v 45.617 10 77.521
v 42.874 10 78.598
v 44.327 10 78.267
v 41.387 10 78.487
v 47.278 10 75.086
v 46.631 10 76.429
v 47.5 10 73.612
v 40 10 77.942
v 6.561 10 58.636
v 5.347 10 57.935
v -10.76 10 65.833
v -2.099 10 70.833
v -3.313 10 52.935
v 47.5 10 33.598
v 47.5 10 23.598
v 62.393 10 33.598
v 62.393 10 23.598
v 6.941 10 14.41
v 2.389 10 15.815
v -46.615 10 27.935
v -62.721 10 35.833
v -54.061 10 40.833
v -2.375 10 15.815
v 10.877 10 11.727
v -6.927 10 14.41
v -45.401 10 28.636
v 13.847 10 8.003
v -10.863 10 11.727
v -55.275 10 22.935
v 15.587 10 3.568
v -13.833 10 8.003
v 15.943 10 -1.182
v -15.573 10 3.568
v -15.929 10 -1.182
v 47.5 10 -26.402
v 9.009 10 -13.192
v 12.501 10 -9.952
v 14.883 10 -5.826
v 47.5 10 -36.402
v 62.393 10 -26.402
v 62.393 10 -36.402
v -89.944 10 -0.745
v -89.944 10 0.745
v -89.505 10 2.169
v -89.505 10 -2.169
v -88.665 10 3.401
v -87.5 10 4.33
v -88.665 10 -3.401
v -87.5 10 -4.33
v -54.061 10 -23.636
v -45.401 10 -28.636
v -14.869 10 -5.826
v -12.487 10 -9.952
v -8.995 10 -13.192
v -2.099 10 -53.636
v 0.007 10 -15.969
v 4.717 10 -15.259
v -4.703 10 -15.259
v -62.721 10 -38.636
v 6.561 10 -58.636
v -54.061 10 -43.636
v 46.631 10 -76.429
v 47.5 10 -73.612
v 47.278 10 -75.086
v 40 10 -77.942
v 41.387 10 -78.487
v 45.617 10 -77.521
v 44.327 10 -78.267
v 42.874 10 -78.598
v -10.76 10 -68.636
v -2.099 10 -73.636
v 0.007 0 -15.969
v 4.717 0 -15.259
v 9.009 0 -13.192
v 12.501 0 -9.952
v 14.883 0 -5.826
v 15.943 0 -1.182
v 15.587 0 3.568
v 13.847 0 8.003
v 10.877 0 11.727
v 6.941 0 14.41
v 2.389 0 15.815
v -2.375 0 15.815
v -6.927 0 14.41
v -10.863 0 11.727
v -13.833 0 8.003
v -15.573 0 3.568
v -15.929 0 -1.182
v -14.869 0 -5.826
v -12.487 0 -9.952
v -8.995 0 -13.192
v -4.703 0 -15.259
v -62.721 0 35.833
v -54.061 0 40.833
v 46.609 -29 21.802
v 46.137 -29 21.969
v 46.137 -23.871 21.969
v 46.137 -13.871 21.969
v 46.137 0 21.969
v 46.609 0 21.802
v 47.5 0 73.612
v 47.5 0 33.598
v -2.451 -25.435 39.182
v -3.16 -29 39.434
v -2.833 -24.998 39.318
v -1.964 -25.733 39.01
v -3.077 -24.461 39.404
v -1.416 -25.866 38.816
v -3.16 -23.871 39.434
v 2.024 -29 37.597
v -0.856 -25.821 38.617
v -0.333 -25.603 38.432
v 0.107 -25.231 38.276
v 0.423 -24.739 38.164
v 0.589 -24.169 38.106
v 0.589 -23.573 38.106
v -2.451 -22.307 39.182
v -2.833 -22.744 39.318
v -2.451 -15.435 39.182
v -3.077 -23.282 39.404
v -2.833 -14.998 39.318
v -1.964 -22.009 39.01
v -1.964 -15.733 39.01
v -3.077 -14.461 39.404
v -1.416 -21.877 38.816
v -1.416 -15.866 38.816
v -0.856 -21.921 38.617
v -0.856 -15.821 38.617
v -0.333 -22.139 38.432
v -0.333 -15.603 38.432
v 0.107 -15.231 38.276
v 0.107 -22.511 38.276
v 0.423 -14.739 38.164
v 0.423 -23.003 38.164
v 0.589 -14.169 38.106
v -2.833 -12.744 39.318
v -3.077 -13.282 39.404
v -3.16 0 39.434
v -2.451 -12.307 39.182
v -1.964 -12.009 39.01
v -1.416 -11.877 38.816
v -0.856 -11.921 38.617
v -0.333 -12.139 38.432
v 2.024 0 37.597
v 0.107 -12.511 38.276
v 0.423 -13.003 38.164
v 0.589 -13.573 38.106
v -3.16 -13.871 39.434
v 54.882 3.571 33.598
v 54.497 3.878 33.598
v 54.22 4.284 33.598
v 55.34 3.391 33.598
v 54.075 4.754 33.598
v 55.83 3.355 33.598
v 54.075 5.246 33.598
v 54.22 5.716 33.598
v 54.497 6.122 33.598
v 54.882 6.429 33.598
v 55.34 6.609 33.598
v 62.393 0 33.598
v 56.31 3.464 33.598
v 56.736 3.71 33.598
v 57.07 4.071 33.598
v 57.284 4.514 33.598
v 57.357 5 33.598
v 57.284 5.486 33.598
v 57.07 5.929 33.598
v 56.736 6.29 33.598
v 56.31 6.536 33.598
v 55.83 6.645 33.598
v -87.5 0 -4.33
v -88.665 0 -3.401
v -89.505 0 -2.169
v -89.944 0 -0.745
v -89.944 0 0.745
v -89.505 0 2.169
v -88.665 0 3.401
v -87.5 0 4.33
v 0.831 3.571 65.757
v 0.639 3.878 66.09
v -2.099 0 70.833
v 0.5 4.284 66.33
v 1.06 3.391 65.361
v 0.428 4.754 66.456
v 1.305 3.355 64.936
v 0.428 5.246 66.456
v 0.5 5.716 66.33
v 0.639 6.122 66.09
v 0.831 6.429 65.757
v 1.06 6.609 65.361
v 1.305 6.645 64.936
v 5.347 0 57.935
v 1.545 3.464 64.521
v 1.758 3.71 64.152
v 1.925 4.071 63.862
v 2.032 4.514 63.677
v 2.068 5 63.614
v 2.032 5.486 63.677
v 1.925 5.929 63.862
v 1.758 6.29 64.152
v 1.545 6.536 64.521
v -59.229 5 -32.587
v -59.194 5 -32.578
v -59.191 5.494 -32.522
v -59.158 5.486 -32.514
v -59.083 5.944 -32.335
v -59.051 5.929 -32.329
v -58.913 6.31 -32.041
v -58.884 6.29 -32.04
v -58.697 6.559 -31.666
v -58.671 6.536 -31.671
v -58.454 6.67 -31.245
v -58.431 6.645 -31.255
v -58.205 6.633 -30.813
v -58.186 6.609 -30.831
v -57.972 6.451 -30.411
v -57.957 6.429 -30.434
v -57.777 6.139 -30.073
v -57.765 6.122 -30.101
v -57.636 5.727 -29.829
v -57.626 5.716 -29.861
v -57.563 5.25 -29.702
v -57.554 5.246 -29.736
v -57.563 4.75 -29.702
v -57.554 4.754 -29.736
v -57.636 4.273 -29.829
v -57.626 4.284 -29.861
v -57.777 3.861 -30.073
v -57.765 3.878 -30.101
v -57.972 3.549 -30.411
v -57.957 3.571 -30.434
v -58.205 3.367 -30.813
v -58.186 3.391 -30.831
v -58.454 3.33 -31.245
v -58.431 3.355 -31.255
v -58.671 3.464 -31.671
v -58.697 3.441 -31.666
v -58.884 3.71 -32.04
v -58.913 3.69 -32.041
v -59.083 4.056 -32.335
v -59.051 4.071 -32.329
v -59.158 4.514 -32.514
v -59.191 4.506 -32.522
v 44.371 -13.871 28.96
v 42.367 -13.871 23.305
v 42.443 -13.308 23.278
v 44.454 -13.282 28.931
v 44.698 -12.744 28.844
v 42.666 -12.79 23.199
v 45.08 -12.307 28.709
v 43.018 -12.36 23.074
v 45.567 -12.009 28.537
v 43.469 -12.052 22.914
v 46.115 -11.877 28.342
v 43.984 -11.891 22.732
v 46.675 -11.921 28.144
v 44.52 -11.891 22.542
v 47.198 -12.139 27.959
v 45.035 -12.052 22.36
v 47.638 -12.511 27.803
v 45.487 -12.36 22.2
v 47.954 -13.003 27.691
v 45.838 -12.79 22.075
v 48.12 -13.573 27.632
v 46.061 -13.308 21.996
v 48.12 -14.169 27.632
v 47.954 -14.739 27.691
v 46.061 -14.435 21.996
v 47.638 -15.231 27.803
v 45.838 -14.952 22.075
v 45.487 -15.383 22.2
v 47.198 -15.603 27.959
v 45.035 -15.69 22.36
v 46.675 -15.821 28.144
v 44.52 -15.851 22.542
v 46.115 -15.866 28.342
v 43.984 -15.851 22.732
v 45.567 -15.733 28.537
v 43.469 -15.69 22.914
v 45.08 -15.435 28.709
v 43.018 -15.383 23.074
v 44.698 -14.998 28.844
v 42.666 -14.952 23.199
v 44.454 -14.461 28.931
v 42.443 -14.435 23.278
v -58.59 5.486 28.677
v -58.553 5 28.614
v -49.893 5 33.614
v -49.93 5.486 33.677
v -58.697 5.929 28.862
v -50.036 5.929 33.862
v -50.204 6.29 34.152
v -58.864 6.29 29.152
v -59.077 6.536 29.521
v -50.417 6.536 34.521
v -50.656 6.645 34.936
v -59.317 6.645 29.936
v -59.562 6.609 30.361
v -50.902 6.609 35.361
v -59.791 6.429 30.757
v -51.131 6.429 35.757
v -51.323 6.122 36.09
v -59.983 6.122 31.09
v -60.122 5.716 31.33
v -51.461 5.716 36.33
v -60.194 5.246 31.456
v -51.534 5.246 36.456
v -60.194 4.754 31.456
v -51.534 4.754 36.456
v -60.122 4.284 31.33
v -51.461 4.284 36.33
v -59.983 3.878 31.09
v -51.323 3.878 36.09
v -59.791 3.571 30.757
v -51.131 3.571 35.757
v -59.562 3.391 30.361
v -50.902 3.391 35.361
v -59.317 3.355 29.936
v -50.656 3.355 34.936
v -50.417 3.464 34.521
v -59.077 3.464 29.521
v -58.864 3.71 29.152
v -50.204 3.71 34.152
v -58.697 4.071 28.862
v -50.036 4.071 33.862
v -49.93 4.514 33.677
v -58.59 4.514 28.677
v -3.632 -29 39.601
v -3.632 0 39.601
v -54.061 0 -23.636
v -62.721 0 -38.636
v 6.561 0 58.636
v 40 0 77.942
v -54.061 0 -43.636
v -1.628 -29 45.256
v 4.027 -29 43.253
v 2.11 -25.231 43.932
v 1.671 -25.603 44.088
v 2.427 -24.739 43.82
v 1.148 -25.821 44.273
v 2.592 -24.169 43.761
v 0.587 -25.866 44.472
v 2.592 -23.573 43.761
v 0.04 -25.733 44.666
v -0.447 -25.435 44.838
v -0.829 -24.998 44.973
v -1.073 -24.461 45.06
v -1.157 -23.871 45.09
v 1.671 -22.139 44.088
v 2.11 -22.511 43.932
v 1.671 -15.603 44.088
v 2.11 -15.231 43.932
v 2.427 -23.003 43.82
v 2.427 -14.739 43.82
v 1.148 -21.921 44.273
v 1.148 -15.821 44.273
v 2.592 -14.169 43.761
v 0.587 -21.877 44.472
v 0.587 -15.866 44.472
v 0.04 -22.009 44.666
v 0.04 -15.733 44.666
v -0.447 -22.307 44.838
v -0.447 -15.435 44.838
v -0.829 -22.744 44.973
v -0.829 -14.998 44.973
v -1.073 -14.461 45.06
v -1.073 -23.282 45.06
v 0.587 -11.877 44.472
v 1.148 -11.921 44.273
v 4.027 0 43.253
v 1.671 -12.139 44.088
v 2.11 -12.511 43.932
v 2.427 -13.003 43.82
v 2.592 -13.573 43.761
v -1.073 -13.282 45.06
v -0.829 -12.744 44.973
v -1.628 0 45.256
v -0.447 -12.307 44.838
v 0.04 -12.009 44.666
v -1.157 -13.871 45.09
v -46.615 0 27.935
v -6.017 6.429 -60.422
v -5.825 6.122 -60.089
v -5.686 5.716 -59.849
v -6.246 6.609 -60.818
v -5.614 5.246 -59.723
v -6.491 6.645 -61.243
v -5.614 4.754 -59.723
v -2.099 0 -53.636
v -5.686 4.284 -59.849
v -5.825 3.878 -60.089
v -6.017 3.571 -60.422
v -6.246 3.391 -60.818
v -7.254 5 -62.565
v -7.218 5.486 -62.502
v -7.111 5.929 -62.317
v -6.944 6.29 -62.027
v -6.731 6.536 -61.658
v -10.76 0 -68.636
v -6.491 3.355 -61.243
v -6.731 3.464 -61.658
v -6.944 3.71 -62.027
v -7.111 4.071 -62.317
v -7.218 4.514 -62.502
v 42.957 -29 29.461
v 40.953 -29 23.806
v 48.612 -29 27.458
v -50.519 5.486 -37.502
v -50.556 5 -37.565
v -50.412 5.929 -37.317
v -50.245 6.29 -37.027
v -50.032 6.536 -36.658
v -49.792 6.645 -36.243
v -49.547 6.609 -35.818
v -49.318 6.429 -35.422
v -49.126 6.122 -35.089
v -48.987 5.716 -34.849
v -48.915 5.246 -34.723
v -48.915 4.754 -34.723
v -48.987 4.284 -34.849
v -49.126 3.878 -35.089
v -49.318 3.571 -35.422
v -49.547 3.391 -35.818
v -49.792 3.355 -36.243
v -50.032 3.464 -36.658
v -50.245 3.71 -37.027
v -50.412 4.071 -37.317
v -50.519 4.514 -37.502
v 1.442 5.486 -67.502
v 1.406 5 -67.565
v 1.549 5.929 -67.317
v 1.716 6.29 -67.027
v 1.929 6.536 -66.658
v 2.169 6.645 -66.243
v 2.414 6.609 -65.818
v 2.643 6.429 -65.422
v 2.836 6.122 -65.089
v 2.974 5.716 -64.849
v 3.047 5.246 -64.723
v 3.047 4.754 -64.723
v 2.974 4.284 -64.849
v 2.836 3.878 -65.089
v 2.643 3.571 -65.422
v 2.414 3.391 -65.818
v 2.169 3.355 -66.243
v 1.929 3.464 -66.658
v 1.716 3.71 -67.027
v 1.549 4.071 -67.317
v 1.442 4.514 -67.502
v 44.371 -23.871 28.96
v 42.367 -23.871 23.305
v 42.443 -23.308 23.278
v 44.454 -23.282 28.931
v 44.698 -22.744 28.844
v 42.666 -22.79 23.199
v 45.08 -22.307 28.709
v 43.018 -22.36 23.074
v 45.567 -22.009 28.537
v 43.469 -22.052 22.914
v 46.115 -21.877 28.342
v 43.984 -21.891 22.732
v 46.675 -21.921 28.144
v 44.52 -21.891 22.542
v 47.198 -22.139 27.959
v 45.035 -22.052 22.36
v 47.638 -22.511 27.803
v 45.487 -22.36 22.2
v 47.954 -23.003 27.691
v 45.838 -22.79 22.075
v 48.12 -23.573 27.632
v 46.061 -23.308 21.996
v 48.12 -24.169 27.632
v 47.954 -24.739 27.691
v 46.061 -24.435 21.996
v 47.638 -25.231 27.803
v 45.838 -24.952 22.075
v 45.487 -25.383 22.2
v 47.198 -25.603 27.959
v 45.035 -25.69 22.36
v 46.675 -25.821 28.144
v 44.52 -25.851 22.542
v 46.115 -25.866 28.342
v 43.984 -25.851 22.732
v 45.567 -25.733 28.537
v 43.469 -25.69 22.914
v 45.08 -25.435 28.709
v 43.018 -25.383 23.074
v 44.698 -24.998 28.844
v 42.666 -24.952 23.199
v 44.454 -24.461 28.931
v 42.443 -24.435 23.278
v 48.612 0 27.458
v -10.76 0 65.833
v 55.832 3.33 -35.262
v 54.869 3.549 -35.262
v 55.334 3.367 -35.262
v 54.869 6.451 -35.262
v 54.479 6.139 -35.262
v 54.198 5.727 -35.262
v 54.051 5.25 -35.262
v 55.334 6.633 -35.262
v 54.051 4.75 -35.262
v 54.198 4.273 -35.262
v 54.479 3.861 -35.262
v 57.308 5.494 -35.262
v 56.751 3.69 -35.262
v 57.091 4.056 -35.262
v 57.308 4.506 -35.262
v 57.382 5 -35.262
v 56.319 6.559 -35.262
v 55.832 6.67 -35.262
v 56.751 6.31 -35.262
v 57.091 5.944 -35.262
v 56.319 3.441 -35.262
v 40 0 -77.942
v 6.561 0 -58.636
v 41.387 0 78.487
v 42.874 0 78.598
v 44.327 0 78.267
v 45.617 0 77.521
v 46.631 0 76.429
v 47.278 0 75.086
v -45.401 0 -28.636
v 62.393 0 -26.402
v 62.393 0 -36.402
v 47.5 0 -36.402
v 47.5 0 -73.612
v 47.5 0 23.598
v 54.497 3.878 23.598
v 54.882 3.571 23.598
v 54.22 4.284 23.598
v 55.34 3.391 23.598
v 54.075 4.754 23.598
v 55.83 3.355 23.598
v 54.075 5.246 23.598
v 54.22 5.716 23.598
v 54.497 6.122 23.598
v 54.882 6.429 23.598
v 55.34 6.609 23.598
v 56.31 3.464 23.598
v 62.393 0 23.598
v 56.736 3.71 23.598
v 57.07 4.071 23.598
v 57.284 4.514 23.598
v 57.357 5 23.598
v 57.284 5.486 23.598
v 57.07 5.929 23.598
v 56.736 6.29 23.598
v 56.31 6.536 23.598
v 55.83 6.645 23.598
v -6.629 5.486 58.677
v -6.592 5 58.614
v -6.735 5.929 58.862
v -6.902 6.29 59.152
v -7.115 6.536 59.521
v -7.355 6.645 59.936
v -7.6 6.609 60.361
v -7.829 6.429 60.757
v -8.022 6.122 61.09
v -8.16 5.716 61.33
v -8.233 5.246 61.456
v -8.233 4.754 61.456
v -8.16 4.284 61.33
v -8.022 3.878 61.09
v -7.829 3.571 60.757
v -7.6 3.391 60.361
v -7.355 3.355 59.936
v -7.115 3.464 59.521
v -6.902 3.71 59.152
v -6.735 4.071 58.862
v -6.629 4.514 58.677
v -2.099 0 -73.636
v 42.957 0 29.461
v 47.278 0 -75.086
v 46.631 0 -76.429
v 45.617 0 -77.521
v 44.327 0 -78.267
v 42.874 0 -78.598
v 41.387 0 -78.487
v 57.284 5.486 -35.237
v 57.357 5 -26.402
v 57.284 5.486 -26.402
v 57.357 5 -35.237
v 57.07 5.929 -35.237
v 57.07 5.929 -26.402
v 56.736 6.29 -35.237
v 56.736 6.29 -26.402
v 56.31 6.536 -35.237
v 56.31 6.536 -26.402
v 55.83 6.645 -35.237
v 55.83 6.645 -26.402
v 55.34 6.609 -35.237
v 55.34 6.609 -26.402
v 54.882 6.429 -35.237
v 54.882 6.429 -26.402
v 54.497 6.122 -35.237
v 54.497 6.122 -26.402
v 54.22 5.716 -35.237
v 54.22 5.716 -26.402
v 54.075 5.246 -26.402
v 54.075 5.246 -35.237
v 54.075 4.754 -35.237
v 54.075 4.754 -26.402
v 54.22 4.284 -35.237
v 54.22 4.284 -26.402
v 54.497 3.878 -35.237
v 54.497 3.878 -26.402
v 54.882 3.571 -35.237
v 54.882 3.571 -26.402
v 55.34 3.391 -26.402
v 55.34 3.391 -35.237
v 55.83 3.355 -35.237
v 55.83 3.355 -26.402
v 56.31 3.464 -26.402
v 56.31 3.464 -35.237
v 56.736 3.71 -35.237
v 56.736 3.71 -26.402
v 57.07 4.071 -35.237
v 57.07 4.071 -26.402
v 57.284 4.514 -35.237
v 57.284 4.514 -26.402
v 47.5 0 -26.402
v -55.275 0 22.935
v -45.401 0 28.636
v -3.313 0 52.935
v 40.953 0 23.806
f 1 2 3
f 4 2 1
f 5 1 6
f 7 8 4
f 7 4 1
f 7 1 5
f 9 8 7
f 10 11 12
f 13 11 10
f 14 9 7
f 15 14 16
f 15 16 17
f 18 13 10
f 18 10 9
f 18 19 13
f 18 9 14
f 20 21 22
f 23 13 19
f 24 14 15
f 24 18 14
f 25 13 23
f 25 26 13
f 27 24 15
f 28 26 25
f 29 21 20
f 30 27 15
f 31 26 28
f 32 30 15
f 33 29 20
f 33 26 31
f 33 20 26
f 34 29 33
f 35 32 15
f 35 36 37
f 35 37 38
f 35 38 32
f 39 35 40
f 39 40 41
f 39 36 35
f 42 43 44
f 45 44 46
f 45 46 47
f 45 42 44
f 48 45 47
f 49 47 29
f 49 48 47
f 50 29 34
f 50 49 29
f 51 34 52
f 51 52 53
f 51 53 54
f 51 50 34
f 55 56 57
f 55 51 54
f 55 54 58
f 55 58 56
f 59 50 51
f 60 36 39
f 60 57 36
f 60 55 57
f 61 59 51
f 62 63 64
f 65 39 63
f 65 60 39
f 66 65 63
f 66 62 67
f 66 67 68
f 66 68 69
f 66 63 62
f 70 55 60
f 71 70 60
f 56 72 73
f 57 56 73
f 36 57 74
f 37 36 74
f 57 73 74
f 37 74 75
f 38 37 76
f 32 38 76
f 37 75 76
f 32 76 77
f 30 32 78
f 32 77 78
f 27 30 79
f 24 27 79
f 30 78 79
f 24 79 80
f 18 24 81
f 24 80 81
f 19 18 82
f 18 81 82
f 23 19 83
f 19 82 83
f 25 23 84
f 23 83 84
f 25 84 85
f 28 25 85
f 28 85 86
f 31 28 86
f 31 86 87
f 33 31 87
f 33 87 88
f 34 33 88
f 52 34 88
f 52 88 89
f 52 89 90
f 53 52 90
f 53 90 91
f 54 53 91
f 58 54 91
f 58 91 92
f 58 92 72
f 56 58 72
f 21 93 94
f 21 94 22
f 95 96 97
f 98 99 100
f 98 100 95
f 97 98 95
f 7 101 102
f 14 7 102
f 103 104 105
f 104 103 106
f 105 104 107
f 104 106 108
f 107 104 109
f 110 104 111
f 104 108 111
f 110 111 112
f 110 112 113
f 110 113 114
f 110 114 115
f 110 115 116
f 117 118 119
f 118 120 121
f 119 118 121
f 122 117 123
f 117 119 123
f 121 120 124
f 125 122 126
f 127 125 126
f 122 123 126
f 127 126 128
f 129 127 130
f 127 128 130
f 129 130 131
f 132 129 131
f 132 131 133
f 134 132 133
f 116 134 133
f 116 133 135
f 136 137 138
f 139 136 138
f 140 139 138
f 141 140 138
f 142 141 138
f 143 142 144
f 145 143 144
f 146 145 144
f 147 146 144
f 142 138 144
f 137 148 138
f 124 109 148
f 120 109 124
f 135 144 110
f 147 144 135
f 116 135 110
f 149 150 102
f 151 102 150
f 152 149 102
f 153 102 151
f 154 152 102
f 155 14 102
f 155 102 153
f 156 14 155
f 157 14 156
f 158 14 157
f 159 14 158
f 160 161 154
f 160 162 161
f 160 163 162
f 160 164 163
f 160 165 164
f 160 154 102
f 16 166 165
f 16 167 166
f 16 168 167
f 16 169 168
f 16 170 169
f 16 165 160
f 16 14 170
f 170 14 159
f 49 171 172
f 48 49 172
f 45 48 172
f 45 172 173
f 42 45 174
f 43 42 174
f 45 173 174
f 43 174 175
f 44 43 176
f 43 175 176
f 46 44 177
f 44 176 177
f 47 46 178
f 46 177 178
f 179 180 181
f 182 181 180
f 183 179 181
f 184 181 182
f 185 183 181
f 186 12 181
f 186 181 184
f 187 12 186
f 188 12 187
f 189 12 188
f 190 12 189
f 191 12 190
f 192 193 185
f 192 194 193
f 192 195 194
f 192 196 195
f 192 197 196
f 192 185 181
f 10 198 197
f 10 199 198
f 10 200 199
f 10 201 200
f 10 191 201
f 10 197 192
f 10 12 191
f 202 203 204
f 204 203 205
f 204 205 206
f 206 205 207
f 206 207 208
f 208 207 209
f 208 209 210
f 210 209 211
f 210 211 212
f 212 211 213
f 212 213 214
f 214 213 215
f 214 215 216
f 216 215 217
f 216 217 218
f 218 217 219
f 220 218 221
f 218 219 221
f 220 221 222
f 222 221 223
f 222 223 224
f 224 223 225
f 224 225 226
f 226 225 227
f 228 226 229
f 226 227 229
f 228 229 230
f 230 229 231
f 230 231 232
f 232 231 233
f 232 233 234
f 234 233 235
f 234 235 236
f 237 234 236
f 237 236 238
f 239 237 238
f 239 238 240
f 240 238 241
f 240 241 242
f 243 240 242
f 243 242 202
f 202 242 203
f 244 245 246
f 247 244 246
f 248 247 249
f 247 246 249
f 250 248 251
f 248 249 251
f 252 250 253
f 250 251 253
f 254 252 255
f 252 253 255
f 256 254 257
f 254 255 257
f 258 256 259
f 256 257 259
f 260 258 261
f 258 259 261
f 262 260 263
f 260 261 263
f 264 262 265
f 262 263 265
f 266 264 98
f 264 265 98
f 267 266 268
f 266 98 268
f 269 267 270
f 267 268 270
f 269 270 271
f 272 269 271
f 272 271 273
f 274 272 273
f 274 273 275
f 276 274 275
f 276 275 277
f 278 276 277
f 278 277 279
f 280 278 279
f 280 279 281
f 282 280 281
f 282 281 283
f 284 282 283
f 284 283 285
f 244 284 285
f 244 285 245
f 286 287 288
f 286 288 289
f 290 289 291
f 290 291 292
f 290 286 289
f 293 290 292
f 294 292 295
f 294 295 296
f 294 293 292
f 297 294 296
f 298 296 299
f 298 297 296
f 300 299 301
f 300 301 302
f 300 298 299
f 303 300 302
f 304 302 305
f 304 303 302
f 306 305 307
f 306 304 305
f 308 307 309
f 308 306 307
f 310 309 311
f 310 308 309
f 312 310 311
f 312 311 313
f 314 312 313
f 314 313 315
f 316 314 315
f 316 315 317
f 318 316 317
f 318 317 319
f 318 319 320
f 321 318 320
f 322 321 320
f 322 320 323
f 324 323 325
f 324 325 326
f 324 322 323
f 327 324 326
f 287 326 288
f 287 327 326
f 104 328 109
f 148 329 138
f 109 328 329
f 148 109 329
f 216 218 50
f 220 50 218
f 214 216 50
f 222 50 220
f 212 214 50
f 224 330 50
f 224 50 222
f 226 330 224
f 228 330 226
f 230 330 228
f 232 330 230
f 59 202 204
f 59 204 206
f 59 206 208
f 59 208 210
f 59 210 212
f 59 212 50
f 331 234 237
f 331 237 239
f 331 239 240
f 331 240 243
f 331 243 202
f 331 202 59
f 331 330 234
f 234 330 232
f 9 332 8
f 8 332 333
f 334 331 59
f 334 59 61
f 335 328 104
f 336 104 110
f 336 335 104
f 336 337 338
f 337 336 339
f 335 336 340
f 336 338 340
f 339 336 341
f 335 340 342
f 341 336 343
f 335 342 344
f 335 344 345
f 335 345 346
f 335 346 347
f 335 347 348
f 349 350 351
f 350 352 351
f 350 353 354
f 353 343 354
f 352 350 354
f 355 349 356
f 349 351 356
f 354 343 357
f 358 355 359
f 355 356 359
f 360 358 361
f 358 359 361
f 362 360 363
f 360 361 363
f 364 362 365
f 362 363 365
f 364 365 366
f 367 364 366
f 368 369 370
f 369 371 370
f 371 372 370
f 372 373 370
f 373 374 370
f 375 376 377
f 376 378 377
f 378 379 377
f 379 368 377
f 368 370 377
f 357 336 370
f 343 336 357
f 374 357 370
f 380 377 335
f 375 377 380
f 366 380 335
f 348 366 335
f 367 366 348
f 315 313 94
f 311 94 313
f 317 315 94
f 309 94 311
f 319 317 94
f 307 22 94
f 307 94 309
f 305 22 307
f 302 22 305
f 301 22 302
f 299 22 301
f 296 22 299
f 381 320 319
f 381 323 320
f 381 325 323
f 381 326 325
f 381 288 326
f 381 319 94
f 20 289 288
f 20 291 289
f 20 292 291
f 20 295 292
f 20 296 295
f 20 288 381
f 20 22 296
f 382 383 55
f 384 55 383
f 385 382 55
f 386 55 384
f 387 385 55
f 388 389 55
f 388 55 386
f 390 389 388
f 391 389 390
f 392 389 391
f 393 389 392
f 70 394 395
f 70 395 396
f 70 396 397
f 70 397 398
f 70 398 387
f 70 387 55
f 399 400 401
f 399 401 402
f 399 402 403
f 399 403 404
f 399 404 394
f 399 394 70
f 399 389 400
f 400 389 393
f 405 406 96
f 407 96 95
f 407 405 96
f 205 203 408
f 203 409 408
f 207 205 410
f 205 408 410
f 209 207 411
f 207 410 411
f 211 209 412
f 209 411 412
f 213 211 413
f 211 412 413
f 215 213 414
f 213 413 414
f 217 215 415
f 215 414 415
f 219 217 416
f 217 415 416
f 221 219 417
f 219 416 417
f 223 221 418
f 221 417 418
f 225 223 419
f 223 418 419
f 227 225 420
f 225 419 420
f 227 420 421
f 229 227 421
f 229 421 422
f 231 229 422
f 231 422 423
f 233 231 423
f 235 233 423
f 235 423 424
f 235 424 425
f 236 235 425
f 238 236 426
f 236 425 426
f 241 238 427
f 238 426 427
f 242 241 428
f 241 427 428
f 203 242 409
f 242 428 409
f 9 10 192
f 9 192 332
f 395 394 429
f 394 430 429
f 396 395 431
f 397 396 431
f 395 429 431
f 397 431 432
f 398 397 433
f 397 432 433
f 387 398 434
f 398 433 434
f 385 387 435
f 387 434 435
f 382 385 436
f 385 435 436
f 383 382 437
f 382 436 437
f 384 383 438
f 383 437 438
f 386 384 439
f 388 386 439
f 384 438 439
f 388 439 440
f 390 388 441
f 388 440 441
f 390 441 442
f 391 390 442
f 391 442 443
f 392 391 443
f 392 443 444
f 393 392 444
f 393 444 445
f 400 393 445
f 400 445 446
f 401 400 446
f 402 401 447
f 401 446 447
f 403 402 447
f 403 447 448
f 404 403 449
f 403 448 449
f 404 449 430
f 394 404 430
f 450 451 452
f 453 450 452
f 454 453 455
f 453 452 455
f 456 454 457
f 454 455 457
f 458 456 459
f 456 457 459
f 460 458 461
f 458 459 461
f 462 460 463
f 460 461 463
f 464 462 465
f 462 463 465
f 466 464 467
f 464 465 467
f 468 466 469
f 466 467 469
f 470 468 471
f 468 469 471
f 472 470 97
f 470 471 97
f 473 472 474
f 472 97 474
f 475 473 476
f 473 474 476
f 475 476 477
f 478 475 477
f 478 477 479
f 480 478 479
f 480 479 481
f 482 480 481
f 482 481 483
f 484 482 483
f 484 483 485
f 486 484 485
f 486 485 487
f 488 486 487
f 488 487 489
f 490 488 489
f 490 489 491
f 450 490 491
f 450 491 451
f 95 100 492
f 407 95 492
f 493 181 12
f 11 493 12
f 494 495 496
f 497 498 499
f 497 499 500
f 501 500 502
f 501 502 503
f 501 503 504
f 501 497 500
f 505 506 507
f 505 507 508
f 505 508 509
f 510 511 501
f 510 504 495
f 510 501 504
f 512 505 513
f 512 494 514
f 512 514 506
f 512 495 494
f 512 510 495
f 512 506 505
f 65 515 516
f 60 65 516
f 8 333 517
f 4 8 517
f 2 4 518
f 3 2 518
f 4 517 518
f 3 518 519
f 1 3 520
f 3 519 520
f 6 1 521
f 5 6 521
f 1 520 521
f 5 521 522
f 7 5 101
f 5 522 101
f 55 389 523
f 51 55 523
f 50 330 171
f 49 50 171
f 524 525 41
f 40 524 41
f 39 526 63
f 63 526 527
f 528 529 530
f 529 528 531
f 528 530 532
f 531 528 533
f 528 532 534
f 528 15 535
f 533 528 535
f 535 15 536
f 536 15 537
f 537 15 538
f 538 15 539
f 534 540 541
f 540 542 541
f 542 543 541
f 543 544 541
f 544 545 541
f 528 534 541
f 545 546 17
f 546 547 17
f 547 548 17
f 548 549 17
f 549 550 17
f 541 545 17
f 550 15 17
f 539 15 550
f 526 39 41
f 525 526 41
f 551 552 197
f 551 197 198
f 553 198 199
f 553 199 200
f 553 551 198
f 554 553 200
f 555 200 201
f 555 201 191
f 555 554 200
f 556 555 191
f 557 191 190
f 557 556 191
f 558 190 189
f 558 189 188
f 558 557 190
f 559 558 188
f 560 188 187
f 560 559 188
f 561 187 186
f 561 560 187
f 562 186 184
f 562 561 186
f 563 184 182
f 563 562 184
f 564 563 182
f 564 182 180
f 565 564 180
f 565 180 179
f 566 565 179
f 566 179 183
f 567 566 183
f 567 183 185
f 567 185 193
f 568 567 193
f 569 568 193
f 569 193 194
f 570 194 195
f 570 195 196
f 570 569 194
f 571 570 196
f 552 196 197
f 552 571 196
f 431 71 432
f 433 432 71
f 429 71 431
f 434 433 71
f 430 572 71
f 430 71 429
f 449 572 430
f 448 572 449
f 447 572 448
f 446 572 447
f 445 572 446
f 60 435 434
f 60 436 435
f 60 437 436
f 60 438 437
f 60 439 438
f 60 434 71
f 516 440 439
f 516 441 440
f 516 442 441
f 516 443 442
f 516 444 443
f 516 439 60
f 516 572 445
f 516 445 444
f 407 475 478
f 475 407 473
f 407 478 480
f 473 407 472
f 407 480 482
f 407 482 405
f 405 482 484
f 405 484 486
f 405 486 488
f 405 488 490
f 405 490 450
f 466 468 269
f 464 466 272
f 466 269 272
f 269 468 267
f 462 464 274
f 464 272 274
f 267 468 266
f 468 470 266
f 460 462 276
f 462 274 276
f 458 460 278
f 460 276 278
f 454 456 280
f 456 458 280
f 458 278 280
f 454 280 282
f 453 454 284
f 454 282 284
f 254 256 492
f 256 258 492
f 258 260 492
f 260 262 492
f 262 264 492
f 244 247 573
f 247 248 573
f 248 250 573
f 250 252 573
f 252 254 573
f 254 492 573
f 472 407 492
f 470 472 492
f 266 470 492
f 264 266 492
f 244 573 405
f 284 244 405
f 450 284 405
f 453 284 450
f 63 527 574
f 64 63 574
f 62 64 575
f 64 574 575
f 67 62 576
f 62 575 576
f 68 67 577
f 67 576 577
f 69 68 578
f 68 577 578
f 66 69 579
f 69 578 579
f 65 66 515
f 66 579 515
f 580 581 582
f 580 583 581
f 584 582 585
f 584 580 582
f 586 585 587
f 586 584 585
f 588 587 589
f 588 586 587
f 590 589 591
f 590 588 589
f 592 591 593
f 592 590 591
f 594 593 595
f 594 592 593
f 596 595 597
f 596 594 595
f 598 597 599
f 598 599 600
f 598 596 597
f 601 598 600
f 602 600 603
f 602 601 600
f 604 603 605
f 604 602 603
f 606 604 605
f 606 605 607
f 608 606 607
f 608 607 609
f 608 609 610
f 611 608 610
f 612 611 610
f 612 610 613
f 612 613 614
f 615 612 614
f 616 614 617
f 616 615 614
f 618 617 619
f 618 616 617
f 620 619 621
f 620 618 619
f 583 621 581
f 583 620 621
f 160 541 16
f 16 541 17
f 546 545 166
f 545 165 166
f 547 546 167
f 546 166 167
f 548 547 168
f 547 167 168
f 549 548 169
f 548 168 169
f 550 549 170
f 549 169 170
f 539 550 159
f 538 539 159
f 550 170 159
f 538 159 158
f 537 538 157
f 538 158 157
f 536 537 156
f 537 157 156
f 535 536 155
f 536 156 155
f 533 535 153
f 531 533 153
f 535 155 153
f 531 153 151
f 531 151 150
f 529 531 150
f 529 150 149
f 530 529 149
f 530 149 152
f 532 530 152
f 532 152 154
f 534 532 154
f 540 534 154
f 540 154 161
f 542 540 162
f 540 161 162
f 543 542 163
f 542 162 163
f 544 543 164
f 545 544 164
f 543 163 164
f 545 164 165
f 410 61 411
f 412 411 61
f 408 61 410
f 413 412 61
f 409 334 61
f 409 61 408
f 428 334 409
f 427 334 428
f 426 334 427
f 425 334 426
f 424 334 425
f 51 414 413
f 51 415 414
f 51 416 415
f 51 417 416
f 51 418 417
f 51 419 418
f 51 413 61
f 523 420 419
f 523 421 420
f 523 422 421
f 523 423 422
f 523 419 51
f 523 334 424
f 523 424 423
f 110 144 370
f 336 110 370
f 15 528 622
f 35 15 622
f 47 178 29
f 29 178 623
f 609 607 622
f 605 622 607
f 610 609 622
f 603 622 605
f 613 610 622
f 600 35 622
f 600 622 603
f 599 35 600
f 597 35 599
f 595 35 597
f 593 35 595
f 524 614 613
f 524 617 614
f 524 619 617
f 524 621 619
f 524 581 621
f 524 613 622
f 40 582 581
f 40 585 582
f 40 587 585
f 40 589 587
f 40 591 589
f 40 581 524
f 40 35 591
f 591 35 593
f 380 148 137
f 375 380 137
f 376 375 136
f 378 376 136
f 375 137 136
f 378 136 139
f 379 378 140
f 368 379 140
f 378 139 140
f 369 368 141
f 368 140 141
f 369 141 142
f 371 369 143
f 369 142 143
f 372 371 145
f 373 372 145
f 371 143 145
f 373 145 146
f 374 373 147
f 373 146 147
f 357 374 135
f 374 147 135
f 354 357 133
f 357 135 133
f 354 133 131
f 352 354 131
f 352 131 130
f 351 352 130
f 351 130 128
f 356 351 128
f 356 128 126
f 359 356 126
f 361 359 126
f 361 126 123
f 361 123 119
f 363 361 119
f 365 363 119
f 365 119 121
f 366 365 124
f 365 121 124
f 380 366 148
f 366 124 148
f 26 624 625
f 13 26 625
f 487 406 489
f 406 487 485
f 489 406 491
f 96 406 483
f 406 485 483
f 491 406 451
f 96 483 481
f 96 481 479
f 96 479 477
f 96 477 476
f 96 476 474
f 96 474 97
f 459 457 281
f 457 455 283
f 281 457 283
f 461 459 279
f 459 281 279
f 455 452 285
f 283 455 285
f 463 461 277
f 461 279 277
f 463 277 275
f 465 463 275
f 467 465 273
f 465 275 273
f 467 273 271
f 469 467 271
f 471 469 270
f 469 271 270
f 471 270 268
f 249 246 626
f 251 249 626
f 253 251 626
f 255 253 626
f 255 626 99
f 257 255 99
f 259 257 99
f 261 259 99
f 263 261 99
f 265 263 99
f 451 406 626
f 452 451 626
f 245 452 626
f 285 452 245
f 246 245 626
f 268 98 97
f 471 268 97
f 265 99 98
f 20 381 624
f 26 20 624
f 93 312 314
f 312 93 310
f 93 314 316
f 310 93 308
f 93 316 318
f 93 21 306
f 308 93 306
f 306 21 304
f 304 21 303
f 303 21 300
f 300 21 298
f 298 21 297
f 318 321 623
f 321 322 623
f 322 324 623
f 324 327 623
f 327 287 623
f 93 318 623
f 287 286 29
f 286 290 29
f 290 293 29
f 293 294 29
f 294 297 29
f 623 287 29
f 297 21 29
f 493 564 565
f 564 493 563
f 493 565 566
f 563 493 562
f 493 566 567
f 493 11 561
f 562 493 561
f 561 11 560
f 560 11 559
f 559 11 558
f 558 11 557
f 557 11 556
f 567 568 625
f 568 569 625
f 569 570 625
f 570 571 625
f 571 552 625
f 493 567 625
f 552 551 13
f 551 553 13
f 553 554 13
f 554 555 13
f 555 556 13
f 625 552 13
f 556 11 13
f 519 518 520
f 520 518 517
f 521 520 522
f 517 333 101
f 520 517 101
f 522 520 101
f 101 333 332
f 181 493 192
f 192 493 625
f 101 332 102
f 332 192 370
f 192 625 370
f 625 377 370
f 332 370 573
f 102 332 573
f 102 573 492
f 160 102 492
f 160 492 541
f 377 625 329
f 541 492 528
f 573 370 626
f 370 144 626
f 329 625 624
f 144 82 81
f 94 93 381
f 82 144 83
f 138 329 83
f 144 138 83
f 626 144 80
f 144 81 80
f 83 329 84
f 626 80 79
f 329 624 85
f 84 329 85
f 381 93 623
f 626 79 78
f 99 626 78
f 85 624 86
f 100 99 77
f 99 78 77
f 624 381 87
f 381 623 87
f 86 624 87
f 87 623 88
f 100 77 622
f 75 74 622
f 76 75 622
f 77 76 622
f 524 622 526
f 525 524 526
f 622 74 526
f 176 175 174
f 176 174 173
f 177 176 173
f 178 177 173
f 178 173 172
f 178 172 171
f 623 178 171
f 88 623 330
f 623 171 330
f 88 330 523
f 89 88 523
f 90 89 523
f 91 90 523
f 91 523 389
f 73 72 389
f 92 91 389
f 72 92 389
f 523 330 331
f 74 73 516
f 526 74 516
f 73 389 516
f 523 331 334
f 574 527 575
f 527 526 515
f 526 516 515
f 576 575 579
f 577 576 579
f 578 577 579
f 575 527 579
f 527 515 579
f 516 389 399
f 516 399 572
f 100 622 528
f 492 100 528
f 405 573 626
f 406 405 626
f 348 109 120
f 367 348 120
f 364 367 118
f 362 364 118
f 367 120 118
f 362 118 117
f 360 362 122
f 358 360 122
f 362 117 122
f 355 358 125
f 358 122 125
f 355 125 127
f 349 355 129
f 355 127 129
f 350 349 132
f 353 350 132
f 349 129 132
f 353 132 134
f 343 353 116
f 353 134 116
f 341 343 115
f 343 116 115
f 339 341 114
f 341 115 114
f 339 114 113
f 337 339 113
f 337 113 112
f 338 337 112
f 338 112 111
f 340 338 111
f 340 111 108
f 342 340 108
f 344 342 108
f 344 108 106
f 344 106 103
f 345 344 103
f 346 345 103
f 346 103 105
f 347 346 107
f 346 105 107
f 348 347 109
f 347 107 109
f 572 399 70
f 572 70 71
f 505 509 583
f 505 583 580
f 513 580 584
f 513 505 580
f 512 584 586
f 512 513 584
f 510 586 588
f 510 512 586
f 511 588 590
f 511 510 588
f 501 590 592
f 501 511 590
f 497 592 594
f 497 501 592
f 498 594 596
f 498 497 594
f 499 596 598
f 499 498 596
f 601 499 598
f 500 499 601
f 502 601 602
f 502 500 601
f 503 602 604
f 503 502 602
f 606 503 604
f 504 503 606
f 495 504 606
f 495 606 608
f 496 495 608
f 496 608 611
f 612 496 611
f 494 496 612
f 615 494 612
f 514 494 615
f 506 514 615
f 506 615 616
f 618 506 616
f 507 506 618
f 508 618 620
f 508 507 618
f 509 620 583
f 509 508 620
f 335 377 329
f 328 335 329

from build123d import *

# Parameters (mm, degrees)
BOSS_EXTRUDE1_DEPTH               = 10
BOSS_EXTRUDE3_DEPTH               = 10
TAP_DRILL_FOR_M4_TAP1_D           = 3.3
TAP_DRILL_FOR_M4_TAP1_CSINK_D     = 3.35
TAP_DRILL_FOR_M4_TAP1_CSINK_ANGLE = 90
CIRPATTERN1_OUTLINE_W             = 0.025
CIRPATTERN1_OUTLINE_H             = 10
CIRPATTERN1_START                 = -36.401802592
CIRPATTERN1_2_OUTLINE_W           = 14.892514764
CIRPATTERN1_2_OUTLINE_H           = 10
CIRPATTERN1_2_OUTLINE_R           = 1.675
CIRPATTERN1_2_DEPTH               = 10
CIRPATTERN1_START_2               = 23.598197408
CIRPATTERN1_3_OUTLINE_W           = 14.892514764
CIRPATTERN1_3_OUTLINE_H           = 10
CIRPATTERN1_3_OUTLINE_R           = 1.675
CIRPATTERN1_3_DEPTH               = 10
CIRPATTERN1_4_OUTLINE_R           = 1.675
CIRPATTERN1_4_DEPTH               = 1.140104786
CIRPATTERN1_5_OUTLINE_W           = 14.892514764
CIRPATTERN1_5_OUTLINE_H           = 10
CIRPATTERN1_5_OUTLINE_R           = 1.65
CIRPATTERN1_5_DEPTH               = 10
CIRPATTERN1_6_OUTLINE_W           = 14.892514764
CIRPATTERN1_6_OUTLINE_H           = 10
CIRPATTERN1_6_OUTLINE_R           = 1.65
CIRPATTERN1_6_DEPTH               = 10
SKETCH13_R                        = 15.980929879
CUT_EXTRUDE1_DEPTH                = 120.91610231
BOSS_EXTRUDE4_DEPTH               = 29
SKETCH16_R                        = 2
CUT_EXTRUDE2_DEPTH                = 6
SKETCH17_R                        = 2
CUT_EXTRUDE3_DEPTH                = 6


with BuildPart() as part:
    # Sketch2 → Boss-Extrude1 (new body)
    with BuildSketch(Plane(origin=(0, 0, 0), x_dir=(0, 0, -1), z_dir=(0, 1, 0))):
        with BuildLine():
            Line((-58.63620668, -6.560889132), (-77.942286341, -40))
            ThreePointArc((-77.942286341, -40), (-77.942286341, -45), (-73.612159322, -47.5))
            Line((-73.612159322, -47.5), (-35, -47.5))
            Line((-35, -47.5), (-25, -47.5))
            Line((-25, -47.5), (25, -47.5))
            Line((25, -47.5), (35, -47.5))
            Line((35, -47.5), (73.612159322, -47.5))
            ThreePointArc((73.612159322, -47.5), (77.942286341, -45), (77.942286341, -40))
            Line((77.942286341, -40), (58.63620668, -6.560889132))
            Line((58.63620668, -6.560889132), (53.63620668, 2.099364905))
            Line((53.63620668, 2.099364905), (28.63620668, 45.400635095))
            Line((28.63620668, 45.400635095), (23.63620668, 54.060889132))
            Line((23.63620668, 54.060889132), (4.330127019, 87.5))
            ThreePointArc((4.330127019, 87.5), (0, 90), (-4.330127019, 87.5))
            Line((-4.330127019, 87.5), (-23.63620668, 54.060889132))
            Line((-23.63620668, 54.060889132), (-28.63620668, 45.400635095))
            Line((-28.63620668, 45.400635095), (-53.63620668, 2.099364905))
            Line((-53.63620668, 2.099364905), (-58.63620668, -6.560889132))
        make_face()
    extrude(amount=BOSS_EXTRUDE1_DEPTH)

    # Sketch2<7> → Boss-Extrude3 (add)
    with BuildSketch(Plane(origin=(0, 0, 0), x_dir=(0, 0, -1), z_dir=(0, 1, 0))):
        Polygon((58.63620668, -6.560889132), (53.63620668, 2.099364905), (68.63620668, 10.759618943), (73.63620668, 2.099364905), align=None)
        Polygon((23.63620668, 54.060889132), (38.63620668, 62.72114317), (43.63620668, 54.060889132), (28.63620668, 45.400635095), align=None)
    extrude(amount=BOSS_EXTRUDE3_DEPTH)

    # Tap Drill for M4 Tap1 (through all)
    with Locations(Plane(origin=(-30.310889132, 0, 17.5), x_dir=(0.49999999999999517, 0, 0.8660254037844415), z_dir=(-0.8660254037844414, 0, 0.4999999999999951))):
        with Locations((-56.160254038, 5)):
            CounterSinkHole(TAP_DRILL_FOR_M4_TAP1_D / 2, TAP_DRILL_FOR_M4_TAP1_CSINK_D / 2, counter_sink_angle=TAP_DRILL_FOR_M4_TAP1_CSINK_ANGLE)



with BuildPart() as body_2:
    # CirPattern1: read off the stored shape, not the designer's step
    # CirPattern1 outline → CirPattern1 (revolve)
    with BuildSketch(Plane(origin=(55.706980142, 5, 0), x_dir=(1, 0, 0), z_dir=(0, -1, 0))):
        with Locations((1.6625, 28.598197408)):
            Rectangle(CIRPATTERN1_OUTLINE_W, CIRPATTERN1_OUTLINE_H)
        Polygon((1.675, -26.401802592), (1.65, -26.401802592), (1.65, -35.236697806), (1.675, -35.261697806), align=None)
    revolve(axis=Axis((55.706980142, 5, 0), (0, 0, 1)))


with BuildPart() as part_1:
    add(part.part)

    add(body_2.part)  # CirPattern1 2 merges body 2
    # CirPattern1 2 outline → CirPattern1 2 (add)
    with BuildSketch(Plane.XY.offset(CIRPATTERN1_START)):
        with Locations((54.946257382, 5)):
            Rectangle(CIRPATTERN1_2_OUTLINE_W, CIRPATTERN1_2_OUTLINE_H)
        with Locations((55.706980142, 5)):
            Circle(CIRPATTERN1_2_OUTLINE_R, mode=Mode.SUBTRACT)
    extrude(amount=CIRPATTERN1_2_DEPTH)

    # CirPattern1 3 outline → CirPattern1 3 (add)
    with BuildSketch(Plane.XY.offset(CIRPATTERN1_START_2)):
        with Locations((54.946257382, 5)):
            Rectangle(CIRPATTERN1_3_OUTLINE_W, CIRPATTERN1_3_OUTLINE_H)
        with Locations((55.706980142, 5)):
            Circle(CIRPATTERN1_3_OUTLINE_R, mode=Mode.SUBTRACT)
    extrude(amount=CIRPATTERN1_3_DEPTH)

    # CirPattern1 4 outline → CirPattern1 4 (add)
    with BuildSketch(Plane.XY.offset(CIRPATTERN1_START)):
        with Locations((55.706980142, 5)):
            Circle(CIRPATTERN1_4_OUTLINE_R)
    extrude(amount=CIRPATTERN1_4_DEPTH)

    # CirPattern1 5 outline → CirPattern1 5 (add)
    with BuildSketch(Plane(origin=(0, 0, 0), x_dir=(0.500000000000001, 0, -0.866025403784438), z_dir=(0.866025403784438, 0, 0.500000000000001)).offset(CIRPATTERN1_START)):
        with Locations((-54.946257382, 5)):
            Rectangle(CIRPATTERN1_5_OUTLINE_W, CIRPATTERN1_5_OUTLINE_H)
        with Locations((-55.706980142, 5)):
            Circle(CIRPATTERN1_5_OUTLINE_R, mode=Mode.SUBTRACT)
    extrude(amount=CIRPATTERN1_5_DEPTH)

    # CirPattern1 6 outline → CirPattern1 6 (add)
    with BuildSketch(Plane(origin=(0, 0, 0), x_dir=(0.500000000000001, 0, -0.866025403784438), z_dir=(0.866025403784438, 0, 0.500000000000001)).offset(CIRPATTERN1_START_2)):
        with Locations((-54.946257382, 5)):
            Rectangle(CIRPATTERN1_6_OUTLINE_W, CIRPATTERN1_6_OUTLINE_H)
        with Locations((-55.706980142, 5)):
            Circle(CIRPATTERN1_6_OUTLINE_R, mode=Mode.SUBTRACT)
    extrude(amount=CIRPATTERN1_6_DEPTH)

    # Sketch13 → Cut-Extrude1 (cut, through all)
    with BuildSketch(Plane.XZ):
        with Locations(Location((0.00701443, 0.012149349, 0), (0, 0, 270))):
            Circle(SKETCH13_R)
    extrude(amount=-CUT_EXTRUDE1_DEPTH, mode=Mode.SUBTRACT)

    # Sketch15 → Boss-Extrude4 (add)
    with BuildSketch(Plane.XZ):
        Polygon((-3.631756095, 39.600919679), (-3.160458196, 39.433951748), (2.023818696, 37.5973045), (4.027433875, 43.252879291), (-1.628140916, 45.25649447), align=None)
        Polygon((46.137302064, 21.969106104), (46.608599963, 21.802138173), (48.612215142, 27.457712963), (42.956640351, 29.461328142), (40.953025172, 23.805753352), align=None)
    extrude(amount=BOSS_EXTRUDE4_DEPTH)

    # Sketch16 → Cut-Extrude2 (cut)
    with BuildSketch(Plane(origin=(12.06005593, 0, 34.041740653), x_dir=(-0.9425957984699193, 0, 0.3339358631636553), z_dir=(-0.33393586316365526, 0, -0.9425957984699191))):
        with Locations((-34.152554668, -23.871092604)):
            Circle(SKETCH16_R)
        with Locations((-34.152554668, -13.871092604)):
            Circle(SKETCH16_R)
    extrude(amount=-CUT_EXTRUDE2_DEPTH, mode=Mode.SUBTRACT)

    # Sketch17 → Cut-Extrude3 (cut)
    with BuildSketch(Plane(origin=(12.06005593, 0, 34.041740653), x_dir=(-0.9425957984699224, 0, 0.33393586316364626), z_dir=(-0.33393586316364626, 0, -0.9425957984699224))):
        with Locations((14.147445332, -23.871092604)):
            Circle(SKETCH17_R)
        with Locations((14.147445332, -13.871092604)):
            Circle(SKETCH17_R)
    extrude(amount=-CUT_EXTRUDE3_DEPTH, mode=Mode.SUBTRACT)


solid = part_1.part
